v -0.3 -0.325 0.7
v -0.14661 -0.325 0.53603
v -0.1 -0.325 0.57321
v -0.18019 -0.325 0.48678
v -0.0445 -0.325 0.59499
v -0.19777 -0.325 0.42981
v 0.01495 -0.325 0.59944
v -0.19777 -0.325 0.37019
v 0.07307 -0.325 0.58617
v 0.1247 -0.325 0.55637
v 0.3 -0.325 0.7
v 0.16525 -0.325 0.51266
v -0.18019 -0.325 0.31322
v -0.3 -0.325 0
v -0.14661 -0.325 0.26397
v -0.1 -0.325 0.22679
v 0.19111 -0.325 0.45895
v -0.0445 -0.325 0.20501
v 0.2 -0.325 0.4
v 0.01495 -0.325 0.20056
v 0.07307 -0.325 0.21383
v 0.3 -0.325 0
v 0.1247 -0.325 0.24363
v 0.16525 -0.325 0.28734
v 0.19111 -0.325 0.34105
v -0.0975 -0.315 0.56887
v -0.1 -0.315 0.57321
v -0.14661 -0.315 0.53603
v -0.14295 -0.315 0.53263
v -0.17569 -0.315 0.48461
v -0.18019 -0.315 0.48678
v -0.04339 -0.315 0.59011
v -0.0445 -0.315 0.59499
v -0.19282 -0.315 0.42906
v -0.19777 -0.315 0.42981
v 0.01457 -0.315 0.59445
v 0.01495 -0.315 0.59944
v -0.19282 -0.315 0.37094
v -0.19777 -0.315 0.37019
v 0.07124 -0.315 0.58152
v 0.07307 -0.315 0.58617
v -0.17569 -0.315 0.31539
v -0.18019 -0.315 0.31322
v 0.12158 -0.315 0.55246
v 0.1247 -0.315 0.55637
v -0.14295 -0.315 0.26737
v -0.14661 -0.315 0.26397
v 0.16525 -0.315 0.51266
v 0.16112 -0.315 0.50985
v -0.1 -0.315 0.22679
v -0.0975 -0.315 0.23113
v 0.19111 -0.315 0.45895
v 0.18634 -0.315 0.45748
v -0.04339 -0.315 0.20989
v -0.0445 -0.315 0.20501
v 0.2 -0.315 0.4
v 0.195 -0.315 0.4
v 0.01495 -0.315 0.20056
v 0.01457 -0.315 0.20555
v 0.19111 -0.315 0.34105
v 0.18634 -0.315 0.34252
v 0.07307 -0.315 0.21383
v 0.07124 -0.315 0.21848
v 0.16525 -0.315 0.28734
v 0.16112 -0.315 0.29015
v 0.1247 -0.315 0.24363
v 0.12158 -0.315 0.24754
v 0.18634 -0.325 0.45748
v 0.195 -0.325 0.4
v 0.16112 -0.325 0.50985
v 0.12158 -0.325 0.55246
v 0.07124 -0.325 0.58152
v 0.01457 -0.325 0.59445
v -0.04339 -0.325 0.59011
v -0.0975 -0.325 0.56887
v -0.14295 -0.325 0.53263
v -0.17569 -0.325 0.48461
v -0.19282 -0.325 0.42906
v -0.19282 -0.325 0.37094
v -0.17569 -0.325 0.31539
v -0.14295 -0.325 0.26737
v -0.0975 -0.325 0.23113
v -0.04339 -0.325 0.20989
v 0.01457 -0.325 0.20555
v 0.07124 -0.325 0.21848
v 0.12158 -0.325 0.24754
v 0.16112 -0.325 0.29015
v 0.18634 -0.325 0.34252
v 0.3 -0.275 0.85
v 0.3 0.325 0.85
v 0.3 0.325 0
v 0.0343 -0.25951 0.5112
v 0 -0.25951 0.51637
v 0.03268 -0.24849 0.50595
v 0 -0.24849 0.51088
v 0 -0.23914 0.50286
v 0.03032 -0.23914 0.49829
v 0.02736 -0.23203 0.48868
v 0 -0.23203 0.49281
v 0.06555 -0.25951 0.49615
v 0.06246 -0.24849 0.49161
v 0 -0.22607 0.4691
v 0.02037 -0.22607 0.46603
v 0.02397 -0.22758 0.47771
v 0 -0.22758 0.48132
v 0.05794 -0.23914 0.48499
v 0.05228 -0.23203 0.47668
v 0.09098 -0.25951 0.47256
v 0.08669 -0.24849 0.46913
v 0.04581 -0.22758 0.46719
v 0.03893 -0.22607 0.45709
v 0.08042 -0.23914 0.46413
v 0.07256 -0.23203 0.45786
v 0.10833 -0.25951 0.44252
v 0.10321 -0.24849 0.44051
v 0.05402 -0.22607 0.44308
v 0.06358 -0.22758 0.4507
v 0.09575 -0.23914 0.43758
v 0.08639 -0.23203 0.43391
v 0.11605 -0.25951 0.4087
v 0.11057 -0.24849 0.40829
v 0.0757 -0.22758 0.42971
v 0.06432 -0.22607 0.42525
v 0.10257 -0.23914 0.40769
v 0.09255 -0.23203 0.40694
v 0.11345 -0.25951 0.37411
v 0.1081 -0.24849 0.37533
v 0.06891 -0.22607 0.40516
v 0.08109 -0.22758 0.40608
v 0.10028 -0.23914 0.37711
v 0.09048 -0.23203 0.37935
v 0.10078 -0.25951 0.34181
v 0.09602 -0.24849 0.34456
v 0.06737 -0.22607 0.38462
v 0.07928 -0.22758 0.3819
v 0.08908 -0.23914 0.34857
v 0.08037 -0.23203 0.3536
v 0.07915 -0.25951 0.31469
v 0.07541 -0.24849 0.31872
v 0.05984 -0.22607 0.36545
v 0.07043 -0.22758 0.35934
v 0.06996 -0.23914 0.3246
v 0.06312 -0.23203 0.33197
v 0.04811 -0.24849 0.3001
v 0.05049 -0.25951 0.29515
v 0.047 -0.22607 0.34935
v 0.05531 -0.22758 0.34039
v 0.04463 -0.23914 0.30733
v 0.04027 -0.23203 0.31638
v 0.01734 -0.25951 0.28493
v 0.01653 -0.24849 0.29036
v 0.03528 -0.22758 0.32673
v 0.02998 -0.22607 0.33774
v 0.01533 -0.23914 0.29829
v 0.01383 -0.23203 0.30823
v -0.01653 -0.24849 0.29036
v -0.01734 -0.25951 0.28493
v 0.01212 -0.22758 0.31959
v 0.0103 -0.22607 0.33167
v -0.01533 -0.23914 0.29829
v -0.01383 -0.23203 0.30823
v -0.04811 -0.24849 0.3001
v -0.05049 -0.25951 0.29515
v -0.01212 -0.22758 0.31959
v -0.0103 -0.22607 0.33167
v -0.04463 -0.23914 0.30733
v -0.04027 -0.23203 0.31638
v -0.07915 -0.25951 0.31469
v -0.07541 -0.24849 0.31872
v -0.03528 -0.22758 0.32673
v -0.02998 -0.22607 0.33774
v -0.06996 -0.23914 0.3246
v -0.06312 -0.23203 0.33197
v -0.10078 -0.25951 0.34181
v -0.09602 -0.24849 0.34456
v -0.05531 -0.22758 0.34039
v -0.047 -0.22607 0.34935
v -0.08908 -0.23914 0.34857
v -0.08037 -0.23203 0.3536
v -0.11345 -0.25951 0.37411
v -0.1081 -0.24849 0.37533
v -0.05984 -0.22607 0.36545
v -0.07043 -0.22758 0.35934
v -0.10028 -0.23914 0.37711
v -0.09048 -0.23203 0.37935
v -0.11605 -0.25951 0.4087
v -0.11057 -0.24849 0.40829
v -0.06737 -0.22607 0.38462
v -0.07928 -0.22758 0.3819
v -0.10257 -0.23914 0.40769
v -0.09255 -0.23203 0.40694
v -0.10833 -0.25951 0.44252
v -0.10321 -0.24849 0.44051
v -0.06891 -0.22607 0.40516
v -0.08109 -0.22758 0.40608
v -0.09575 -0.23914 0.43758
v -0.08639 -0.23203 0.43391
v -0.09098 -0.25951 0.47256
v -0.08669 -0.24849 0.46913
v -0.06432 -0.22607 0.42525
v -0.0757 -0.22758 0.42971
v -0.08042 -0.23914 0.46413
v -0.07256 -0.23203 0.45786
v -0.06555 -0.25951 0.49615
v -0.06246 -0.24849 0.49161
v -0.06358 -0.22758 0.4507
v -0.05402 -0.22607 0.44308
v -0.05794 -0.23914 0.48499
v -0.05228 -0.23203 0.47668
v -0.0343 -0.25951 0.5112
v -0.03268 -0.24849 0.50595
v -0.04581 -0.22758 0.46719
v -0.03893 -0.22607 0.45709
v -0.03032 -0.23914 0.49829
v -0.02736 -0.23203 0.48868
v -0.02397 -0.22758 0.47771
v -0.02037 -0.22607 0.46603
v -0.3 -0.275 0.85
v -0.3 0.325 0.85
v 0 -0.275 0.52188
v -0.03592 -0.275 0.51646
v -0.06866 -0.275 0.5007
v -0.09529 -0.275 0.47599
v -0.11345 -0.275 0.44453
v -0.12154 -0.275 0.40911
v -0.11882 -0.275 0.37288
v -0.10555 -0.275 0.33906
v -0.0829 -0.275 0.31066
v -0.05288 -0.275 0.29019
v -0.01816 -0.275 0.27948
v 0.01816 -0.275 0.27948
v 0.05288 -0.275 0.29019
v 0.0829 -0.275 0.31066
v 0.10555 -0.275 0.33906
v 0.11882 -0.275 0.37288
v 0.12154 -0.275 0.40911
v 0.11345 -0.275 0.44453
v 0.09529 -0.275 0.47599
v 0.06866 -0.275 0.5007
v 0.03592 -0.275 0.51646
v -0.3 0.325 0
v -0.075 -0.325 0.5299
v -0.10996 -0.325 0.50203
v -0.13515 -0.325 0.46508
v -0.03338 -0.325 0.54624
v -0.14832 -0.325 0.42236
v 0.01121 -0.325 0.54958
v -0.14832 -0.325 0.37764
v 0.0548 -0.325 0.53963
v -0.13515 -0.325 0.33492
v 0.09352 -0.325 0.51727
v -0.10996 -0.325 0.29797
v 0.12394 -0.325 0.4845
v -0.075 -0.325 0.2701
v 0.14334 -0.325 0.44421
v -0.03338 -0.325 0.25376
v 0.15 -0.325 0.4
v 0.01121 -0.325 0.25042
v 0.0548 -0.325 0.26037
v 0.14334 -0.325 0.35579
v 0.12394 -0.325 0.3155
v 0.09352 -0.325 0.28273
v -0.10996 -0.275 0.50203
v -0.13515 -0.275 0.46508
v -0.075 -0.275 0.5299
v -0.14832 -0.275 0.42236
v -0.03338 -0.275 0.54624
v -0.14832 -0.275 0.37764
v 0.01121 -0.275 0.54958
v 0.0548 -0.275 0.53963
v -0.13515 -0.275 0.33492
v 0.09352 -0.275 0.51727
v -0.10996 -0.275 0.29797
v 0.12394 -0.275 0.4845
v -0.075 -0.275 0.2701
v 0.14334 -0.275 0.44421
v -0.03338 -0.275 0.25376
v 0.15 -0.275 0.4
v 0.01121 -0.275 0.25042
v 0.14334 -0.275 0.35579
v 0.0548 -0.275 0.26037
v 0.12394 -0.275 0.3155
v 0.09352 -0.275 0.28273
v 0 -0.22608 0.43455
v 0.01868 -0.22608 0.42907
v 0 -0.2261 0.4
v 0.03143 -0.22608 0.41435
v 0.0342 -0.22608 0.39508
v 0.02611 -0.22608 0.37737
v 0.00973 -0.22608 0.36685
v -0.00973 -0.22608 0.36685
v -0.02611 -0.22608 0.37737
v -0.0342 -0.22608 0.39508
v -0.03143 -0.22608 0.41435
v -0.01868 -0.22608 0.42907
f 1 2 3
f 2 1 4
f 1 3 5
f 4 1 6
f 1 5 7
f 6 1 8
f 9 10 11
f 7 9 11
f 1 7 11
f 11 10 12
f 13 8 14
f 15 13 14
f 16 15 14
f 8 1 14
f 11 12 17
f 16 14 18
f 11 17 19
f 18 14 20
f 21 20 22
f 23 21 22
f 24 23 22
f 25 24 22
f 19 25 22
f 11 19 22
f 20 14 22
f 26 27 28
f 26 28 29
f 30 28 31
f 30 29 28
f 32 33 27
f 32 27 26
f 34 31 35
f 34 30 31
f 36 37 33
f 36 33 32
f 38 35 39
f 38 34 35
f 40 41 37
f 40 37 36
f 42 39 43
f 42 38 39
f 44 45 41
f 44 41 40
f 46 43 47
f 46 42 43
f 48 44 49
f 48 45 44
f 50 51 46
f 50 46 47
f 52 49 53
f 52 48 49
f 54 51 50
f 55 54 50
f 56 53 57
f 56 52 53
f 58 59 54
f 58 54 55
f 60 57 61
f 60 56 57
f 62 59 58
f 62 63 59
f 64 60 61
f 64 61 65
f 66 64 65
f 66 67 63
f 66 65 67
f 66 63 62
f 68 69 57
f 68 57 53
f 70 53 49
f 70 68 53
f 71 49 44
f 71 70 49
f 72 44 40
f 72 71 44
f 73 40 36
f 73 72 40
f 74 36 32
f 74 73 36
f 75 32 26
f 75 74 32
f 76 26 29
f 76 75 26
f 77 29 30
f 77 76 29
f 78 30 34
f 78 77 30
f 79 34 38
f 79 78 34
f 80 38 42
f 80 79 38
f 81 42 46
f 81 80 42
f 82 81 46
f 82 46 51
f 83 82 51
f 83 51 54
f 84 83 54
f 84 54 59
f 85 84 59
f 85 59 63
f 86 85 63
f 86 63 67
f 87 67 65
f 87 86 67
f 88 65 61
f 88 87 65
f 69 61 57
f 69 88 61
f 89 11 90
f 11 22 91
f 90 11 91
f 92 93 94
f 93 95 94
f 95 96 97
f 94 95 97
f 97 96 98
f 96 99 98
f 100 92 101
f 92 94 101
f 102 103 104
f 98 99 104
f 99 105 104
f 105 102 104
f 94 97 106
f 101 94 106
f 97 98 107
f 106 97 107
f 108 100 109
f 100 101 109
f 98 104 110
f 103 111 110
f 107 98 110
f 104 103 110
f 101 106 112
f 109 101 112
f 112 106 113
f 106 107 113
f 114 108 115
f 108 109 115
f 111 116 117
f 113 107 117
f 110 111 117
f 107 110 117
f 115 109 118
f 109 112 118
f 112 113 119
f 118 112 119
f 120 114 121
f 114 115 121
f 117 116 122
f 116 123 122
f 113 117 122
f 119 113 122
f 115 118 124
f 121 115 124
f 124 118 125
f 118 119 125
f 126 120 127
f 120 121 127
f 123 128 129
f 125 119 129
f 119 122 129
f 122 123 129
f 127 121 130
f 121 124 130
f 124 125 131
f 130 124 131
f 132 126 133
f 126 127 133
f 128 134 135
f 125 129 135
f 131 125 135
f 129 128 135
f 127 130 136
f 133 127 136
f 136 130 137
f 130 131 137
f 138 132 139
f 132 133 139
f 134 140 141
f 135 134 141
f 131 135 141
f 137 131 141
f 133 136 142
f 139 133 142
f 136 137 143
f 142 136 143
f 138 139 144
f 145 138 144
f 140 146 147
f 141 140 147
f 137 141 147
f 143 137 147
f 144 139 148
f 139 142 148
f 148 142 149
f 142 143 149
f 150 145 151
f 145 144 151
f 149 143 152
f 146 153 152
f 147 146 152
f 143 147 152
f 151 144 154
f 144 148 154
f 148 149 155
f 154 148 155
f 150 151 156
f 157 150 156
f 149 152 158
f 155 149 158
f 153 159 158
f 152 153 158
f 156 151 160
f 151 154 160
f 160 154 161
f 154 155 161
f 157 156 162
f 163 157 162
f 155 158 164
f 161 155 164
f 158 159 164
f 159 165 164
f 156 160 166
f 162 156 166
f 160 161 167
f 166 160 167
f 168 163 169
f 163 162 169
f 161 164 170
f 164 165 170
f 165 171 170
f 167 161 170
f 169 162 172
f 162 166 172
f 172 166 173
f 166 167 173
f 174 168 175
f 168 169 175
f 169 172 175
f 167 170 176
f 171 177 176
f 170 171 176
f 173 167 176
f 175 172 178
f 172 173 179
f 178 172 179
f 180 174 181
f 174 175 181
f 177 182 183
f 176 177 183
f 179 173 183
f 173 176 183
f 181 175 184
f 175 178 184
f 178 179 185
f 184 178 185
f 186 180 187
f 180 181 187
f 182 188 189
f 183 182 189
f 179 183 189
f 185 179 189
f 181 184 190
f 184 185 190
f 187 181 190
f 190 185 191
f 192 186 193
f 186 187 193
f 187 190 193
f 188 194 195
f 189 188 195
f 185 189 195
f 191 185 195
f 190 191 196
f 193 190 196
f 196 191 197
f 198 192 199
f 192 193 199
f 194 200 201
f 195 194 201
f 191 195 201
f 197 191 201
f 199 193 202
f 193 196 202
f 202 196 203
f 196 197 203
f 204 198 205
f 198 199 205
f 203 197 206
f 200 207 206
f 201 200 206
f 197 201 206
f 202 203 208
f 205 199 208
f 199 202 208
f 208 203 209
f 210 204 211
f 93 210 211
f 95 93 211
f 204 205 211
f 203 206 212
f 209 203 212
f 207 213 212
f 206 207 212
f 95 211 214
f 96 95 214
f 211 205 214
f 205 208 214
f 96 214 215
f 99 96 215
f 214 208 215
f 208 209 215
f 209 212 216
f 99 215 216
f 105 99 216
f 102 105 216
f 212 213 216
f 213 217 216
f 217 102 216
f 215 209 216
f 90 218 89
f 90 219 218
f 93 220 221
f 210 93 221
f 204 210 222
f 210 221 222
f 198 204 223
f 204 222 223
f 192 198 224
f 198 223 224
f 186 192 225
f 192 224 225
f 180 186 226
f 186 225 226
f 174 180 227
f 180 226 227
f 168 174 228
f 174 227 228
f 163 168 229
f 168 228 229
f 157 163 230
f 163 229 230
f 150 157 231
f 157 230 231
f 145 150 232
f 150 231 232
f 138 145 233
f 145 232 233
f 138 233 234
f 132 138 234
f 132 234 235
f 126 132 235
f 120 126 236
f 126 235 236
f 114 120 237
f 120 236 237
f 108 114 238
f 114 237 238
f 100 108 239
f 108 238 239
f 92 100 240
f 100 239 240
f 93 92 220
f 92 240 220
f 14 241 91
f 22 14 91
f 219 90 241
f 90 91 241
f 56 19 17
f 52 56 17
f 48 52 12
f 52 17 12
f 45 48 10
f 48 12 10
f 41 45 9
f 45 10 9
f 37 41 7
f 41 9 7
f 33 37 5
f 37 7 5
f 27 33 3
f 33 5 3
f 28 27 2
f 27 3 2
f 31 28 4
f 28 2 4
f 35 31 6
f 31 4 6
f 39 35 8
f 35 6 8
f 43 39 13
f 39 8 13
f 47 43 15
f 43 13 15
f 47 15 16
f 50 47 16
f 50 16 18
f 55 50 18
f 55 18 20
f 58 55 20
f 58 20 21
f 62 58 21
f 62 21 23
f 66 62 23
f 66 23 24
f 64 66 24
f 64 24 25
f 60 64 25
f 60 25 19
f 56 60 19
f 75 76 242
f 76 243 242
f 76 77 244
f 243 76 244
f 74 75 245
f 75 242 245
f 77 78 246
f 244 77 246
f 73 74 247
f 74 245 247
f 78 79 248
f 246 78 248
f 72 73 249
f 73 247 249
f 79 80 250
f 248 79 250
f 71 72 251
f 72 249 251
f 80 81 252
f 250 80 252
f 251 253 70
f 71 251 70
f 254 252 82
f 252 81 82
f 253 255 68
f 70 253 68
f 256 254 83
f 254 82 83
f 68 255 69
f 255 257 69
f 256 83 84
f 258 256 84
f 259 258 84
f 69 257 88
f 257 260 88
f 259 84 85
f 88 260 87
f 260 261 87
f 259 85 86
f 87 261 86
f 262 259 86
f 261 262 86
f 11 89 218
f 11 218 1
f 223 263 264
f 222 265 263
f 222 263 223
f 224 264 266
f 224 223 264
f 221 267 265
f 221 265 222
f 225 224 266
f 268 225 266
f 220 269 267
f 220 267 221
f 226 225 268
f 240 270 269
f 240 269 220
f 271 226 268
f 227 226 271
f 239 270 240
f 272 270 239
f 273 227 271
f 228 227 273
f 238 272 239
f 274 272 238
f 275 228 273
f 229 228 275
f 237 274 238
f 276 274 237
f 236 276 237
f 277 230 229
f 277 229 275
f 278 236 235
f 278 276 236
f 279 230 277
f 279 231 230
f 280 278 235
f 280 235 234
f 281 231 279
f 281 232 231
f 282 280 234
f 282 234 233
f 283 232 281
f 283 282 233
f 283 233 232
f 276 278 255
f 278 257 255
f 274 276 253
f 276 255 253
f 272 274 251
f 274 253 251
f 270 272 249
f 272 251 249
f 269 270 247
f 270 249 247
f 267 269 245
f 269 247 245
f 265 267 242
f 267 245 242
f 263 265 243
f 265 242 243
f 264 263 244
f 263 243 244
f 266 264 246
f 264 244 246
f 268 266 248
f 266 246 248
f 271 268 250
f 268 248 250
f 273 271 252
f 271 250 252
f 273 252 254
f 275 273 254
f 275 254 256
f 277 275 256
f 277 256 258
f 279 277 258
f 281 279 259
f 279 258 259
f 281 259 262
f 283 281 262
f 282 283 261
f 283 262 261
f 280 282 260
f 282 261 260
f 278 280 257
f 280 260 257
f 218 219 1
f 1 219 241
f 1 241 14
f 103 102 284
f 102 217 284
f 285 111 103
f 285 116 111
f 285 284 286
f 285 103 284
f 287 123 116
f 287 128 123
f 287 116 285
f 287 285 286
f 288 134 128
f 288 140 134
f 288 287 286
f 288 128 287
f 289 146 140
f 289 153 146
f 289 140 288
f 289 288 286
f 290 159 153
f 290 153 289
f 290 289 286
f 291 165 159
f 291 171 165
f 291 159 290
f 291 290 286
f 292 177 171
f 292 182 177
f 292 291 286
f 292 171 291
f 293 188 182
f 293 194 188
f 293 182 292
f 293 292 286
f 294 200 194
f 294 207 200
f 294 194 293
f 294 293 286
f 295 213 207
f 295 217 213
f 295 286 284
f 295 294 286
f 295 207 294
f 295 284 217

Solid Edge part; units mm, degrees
sketch "Sketch1" plane through (0, 0, 0) normal (0, 0, 1) x (1, 0, 0)
  line L0 (-0.3, -0.325) -> (0.3, -0.325)
  line L1 (0.3, -0.325) -> (0.3, 0.325)
  line L2 (0.3, 0.325) -> (-0.3, 0.325)
  line L3 (-0.3, 0.325) -> (-0.3, -0.325)
  dimension "D1" = 0.6
  dimension "D2" = 0.65
extrude "Protrusion1" add sketch "Sketch1" along normal blind 0.85
sketch "Sketch2" plane through (0, -0.325, 0.425) normal (0, -1, 0) x (1, 0, 0)
  circle A0 centre (0, -0.025) radius 0.195
  circle A1 centre (0, -0.025) radius 0.2
  dimension "D1" = 0.4
  dimension "D2" = 0.39
  dimension "D3" = 0.4
extrude "Ausschnitt_1" cut sketch "Sketch2" against normal blind 0.01
sketch "Sketch3" plane through (0, -0.325, 0.316) normal (0, -1, 0) x (1, 0, 0)
  circle A0 centre (0, 0.084) radius 0.15
  dimension "D1" = 0.3
extrude "Ausschnitt_2" cut sketch "Sketch3" against normal blind 0.05
sketch "Sketch4" plane through (0.3, 0, 0.425) normal (1, 0, 0) x (0, 1, 0)
  line L0 (-0.275, 0.425) -> (-0.325, 0.425)
  line L1 (-0.325, 0.425) -> (-0.325, 0.275)
  line L2 (-0.275, 0.425) -> (-0.325, 0.275)
  dimension "D1" = 0.05
  dimension "D2" = 0.15
extrude "Cutout1" cut sketch "Sketch4" against normal through all
sketch "Sketch5" plane through (0, 0, 0) normal (1, 0, 0) x (0, 1, 0)
  line L0 (-0.3152, 0.5362) -> (-0.2595, 0.5164)
  arc A0 (-0.2595, 0.5164) -> (-0.2261, 0.4691) centre (-0.2762, 0.4691) cw
  line L1 (-0.2261, 0.4691) -> (-0.2261, 0.4)
  line L2 (-0.2261, 0.4) -> (-0.325, 0.4)
  line L3 (-0.325, 0.4) -> (-0.325, 0.55)
  arc A1 (-0.3152, 0.5362) -> (-0.325, 0.55) centre (-0.3103, 0.55) cw
  dimension "D1" = 0.2261
  dimension "D2" = 0.325
revolve "RevolvedCutout1" cut sketch "Sketch5" angle 360 about axis through (0, -0.325, 0.4) along (0, 1, 0)
